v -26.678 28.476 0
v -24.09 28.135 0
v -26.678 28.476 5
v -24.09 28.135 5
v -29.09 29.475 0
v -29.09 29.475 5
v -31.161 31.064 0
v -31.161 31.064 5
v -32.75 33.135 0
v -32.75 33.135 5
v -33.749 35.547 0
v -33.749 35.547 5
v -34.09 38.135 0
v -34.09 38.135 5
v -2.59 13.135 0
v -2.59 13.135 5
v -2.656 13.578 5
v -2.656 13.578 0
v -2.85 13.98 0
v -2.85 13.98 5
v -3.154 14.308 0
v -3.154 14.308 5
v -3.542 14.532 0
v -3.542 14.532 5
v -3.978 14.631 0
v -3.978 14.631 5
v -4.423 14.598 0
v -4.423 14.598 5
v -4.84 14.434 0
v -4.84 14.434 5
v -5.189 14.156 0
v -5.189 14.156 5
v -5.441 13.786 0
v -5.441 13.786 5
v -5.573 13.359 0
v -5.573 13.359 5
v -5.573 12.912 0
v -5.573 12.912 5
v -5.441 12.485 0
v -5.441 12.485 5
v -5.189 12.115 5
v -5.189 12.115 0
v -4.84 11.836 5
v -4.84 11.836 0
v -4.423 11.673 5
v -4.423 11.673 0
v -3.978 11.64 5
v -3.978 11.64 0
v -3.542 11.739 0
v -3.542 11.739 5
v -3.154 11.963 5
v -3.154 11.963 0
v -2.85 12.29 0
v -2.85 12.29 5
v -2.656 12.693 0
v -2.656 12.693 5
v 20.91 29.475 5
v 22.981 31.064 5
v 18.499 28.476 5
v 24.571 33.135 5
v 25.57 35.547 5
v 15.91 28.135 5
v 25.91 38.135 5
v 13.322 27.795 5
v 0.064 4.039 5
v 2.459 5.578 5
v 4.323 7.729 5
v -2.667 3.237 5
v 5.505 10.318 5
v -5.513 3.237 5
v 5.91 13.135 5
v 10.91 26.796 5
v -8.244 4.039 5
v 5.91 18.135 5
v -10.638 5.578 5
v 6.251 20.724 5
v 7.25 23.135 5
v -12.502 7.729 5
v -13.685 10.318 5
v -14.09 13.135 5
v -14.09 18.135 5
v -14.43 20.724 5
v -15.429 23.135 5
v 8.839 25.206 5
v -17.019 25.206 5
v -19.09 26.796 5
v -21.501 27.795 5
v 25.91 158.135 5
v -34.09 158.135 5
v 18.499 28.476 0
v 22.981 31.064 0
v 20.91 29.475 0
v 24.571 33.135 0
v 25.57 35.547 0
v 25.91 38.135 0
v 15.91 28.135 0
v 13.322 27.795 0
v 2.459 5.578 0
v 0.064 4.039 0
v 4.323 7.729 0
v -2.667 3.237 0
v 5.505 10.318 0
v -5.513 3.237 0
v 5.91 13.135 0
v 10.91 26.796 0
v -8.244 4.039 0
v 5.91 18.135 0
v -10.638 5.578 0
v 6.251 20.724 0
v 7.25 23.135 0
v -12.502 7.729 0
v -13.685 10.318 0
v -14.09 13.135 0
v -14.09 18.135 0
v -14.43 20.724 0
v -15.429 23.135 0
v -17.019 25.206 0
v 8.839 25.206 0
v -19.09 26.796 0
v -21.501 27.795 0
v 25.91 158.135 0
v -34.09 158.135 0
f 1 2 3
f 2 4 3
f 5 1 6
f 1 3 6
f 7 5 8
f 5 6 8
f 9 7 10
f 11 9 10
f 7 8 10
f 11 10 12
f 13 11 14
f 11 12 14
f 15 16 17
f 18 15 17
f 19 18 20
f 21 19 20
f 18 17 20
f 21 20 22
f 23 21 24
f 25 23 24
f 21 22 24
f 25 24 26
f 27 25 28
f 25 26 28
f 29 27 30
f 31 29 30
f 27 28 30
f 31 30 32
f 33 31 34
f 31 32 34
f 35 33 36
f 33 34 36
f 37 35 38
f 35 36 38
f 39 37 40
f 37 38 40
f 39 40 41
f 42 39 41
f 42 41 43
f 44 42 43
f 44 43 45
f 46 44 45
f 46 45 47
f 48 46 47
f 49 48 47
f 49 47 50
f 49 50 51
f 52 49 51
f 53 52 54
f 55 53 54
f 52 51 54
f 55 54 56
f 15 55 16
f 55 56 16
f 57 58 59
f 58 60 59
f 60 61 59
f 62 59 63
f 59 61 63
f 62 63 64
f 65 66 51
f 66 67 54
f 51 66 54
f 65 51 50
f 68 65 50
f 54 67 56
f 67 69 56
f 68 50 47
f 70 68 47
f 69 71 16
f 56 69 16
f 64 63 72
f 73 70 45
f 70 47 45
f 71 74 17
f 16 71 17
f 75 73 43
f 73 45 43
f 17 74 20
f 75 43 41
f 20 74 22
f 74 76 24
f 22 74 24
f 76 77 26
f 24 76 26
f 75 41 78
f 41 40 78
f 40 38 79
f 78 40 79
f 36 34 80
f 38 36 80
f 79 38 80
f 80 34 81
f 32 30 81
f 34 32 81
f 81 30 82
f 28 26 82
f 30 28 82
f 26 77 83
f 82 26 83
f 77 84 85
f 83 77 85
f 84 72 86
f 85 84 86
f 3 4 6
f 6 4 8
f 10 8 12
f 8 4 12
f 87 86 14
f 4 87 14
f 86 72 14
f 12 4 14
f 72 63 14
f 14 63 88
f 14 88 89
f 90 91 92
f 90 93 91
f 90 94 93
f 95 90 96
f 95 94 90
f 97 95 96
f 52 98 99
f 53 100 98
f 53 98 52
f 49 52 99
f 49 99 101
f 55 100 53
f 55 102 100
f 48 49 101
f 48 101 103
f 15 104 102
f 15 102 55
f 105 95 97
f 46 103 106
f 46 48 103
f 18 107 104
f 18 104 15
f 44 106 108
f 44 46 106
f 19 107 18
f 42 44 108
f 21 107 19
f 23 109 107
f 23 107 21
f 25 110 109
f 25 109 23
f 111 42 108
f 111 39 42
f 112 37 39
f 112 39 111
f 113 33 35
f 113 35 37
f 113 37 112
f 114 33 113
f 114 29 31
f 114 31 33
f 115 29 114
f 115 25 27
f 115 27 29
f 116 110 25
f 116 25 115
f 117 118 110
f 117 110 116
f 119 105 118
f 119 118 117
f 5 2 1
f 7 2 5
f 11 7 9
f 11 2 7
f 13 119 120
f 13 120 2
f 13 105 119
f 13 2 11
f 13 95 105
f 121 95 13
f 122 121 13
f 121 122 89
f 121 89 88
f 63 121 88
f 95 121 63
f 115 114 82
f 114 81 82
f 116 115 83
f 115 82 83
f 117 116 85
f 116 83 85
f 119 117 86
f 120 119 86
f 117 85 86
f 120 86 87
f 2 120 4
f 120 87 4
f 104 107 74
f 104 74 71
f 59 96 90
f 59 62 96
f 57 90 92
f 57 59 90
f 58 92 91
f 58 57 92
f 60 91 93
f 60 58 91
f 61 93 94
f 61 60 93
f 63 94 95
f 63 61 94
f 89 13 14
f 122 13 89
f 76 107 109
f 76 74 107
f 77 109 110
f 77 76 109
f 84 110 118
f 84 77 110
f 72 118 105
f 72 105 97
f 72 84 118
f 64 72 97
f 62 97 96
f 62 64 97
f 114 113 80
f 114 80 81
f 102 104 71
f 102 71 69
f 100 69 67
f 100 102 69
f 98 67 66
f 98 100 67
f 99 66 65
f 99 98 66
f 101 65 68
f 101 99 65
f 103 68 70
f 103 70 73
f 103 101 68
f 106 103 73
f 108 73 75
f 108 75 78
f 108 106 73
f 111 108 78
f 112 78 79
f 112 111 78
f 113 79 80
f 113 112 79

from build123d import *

# Parameters (mm, degrees)
RESSALTO_EXTRUS_O1_DEPTH = 5
ESBO_O2_R                = 1.5
CORTE_EXTRUS_O1_DEPTH    = 5
FILETE1_R                = 10


with BuildPart() as part:
    # Esboço1 → Ressalto-extrusão1 (new body)
    with BuildSketch(Plane.XY):
        with BuildLine():
            Line((-14.089663978, 13.135393664), (-14.089663978, 28.135393664))
            Line((-14.089663978, 28.135393664), (-34.089663978, 28.135393664))
            Line((-34.089663978, 28.135393664), (-34.089663978, 158.135393664))
            Line((-34.089663978, 158.135393664), (25.910336022, 158.135393664))
            Line((25.910336022, 158.135393664), (25.910336022, 28.135393664))
            Line((25.910336022, 28.135393664), (5.910336022, 28.135393664))
            Line((5.910336022, 28.135393664), (5.910336022, 13.135393664))
            ThreePointArc((5.910336022, 13.135393664), (-4.089663978, 3.135393664), (-14.089663978, 13.135393664))
        make_face()
    extrude(amount=RESSALTO_EXTRUS_O1_DEPTH)

    # Esboço2 → Corte-extrusão1 (cut)
    with BuildSketch(Plane.XY.offset(5)):
        with Locations((-4.089663978, 13.135393664)):
            Circle(ESBO_O2_R)
    extrude(amount=-CORTE_EXTRUS_O1_DEPTH, mode=Mode.SUBTRACT)

    # Filete1
    filete1_edges = [part.edges().sort_by_distance(p)[0] for p in [
        (-14.089663978, 28.135393664, 2.5),
    ]]
    fillet(filete1_edges, radius=FILETE1_R)
    filete1_2_edges = [part.edges().sort_by_distance(p)[0] for p in [
        (-34.089663978, 28.135393664, 2.5),
    ]]
    fillet(filete1_2_edges, radius=FILETE1_R - 0.0001)  # a hair under: the kernel refuses the full size
    filete1_3_edges = [part.edges().sort_by_distance(p)[0] for p in [
        (5.910336022, 28.135393664, 2.5),
    ]]
    fillet(filete1_3_edges, radius=FILETE1_R)
    filete1_4_edges = [part.edges().sort_by_distance(p)[0] for p in [
        (25.910336022, 28.135393664, 2.5),
    ]]
    fillet(filete1_4_edges, radius=FILETE1_R - 0.0001)  # a hair under: the kernel refuses the full size


solid = part.part
